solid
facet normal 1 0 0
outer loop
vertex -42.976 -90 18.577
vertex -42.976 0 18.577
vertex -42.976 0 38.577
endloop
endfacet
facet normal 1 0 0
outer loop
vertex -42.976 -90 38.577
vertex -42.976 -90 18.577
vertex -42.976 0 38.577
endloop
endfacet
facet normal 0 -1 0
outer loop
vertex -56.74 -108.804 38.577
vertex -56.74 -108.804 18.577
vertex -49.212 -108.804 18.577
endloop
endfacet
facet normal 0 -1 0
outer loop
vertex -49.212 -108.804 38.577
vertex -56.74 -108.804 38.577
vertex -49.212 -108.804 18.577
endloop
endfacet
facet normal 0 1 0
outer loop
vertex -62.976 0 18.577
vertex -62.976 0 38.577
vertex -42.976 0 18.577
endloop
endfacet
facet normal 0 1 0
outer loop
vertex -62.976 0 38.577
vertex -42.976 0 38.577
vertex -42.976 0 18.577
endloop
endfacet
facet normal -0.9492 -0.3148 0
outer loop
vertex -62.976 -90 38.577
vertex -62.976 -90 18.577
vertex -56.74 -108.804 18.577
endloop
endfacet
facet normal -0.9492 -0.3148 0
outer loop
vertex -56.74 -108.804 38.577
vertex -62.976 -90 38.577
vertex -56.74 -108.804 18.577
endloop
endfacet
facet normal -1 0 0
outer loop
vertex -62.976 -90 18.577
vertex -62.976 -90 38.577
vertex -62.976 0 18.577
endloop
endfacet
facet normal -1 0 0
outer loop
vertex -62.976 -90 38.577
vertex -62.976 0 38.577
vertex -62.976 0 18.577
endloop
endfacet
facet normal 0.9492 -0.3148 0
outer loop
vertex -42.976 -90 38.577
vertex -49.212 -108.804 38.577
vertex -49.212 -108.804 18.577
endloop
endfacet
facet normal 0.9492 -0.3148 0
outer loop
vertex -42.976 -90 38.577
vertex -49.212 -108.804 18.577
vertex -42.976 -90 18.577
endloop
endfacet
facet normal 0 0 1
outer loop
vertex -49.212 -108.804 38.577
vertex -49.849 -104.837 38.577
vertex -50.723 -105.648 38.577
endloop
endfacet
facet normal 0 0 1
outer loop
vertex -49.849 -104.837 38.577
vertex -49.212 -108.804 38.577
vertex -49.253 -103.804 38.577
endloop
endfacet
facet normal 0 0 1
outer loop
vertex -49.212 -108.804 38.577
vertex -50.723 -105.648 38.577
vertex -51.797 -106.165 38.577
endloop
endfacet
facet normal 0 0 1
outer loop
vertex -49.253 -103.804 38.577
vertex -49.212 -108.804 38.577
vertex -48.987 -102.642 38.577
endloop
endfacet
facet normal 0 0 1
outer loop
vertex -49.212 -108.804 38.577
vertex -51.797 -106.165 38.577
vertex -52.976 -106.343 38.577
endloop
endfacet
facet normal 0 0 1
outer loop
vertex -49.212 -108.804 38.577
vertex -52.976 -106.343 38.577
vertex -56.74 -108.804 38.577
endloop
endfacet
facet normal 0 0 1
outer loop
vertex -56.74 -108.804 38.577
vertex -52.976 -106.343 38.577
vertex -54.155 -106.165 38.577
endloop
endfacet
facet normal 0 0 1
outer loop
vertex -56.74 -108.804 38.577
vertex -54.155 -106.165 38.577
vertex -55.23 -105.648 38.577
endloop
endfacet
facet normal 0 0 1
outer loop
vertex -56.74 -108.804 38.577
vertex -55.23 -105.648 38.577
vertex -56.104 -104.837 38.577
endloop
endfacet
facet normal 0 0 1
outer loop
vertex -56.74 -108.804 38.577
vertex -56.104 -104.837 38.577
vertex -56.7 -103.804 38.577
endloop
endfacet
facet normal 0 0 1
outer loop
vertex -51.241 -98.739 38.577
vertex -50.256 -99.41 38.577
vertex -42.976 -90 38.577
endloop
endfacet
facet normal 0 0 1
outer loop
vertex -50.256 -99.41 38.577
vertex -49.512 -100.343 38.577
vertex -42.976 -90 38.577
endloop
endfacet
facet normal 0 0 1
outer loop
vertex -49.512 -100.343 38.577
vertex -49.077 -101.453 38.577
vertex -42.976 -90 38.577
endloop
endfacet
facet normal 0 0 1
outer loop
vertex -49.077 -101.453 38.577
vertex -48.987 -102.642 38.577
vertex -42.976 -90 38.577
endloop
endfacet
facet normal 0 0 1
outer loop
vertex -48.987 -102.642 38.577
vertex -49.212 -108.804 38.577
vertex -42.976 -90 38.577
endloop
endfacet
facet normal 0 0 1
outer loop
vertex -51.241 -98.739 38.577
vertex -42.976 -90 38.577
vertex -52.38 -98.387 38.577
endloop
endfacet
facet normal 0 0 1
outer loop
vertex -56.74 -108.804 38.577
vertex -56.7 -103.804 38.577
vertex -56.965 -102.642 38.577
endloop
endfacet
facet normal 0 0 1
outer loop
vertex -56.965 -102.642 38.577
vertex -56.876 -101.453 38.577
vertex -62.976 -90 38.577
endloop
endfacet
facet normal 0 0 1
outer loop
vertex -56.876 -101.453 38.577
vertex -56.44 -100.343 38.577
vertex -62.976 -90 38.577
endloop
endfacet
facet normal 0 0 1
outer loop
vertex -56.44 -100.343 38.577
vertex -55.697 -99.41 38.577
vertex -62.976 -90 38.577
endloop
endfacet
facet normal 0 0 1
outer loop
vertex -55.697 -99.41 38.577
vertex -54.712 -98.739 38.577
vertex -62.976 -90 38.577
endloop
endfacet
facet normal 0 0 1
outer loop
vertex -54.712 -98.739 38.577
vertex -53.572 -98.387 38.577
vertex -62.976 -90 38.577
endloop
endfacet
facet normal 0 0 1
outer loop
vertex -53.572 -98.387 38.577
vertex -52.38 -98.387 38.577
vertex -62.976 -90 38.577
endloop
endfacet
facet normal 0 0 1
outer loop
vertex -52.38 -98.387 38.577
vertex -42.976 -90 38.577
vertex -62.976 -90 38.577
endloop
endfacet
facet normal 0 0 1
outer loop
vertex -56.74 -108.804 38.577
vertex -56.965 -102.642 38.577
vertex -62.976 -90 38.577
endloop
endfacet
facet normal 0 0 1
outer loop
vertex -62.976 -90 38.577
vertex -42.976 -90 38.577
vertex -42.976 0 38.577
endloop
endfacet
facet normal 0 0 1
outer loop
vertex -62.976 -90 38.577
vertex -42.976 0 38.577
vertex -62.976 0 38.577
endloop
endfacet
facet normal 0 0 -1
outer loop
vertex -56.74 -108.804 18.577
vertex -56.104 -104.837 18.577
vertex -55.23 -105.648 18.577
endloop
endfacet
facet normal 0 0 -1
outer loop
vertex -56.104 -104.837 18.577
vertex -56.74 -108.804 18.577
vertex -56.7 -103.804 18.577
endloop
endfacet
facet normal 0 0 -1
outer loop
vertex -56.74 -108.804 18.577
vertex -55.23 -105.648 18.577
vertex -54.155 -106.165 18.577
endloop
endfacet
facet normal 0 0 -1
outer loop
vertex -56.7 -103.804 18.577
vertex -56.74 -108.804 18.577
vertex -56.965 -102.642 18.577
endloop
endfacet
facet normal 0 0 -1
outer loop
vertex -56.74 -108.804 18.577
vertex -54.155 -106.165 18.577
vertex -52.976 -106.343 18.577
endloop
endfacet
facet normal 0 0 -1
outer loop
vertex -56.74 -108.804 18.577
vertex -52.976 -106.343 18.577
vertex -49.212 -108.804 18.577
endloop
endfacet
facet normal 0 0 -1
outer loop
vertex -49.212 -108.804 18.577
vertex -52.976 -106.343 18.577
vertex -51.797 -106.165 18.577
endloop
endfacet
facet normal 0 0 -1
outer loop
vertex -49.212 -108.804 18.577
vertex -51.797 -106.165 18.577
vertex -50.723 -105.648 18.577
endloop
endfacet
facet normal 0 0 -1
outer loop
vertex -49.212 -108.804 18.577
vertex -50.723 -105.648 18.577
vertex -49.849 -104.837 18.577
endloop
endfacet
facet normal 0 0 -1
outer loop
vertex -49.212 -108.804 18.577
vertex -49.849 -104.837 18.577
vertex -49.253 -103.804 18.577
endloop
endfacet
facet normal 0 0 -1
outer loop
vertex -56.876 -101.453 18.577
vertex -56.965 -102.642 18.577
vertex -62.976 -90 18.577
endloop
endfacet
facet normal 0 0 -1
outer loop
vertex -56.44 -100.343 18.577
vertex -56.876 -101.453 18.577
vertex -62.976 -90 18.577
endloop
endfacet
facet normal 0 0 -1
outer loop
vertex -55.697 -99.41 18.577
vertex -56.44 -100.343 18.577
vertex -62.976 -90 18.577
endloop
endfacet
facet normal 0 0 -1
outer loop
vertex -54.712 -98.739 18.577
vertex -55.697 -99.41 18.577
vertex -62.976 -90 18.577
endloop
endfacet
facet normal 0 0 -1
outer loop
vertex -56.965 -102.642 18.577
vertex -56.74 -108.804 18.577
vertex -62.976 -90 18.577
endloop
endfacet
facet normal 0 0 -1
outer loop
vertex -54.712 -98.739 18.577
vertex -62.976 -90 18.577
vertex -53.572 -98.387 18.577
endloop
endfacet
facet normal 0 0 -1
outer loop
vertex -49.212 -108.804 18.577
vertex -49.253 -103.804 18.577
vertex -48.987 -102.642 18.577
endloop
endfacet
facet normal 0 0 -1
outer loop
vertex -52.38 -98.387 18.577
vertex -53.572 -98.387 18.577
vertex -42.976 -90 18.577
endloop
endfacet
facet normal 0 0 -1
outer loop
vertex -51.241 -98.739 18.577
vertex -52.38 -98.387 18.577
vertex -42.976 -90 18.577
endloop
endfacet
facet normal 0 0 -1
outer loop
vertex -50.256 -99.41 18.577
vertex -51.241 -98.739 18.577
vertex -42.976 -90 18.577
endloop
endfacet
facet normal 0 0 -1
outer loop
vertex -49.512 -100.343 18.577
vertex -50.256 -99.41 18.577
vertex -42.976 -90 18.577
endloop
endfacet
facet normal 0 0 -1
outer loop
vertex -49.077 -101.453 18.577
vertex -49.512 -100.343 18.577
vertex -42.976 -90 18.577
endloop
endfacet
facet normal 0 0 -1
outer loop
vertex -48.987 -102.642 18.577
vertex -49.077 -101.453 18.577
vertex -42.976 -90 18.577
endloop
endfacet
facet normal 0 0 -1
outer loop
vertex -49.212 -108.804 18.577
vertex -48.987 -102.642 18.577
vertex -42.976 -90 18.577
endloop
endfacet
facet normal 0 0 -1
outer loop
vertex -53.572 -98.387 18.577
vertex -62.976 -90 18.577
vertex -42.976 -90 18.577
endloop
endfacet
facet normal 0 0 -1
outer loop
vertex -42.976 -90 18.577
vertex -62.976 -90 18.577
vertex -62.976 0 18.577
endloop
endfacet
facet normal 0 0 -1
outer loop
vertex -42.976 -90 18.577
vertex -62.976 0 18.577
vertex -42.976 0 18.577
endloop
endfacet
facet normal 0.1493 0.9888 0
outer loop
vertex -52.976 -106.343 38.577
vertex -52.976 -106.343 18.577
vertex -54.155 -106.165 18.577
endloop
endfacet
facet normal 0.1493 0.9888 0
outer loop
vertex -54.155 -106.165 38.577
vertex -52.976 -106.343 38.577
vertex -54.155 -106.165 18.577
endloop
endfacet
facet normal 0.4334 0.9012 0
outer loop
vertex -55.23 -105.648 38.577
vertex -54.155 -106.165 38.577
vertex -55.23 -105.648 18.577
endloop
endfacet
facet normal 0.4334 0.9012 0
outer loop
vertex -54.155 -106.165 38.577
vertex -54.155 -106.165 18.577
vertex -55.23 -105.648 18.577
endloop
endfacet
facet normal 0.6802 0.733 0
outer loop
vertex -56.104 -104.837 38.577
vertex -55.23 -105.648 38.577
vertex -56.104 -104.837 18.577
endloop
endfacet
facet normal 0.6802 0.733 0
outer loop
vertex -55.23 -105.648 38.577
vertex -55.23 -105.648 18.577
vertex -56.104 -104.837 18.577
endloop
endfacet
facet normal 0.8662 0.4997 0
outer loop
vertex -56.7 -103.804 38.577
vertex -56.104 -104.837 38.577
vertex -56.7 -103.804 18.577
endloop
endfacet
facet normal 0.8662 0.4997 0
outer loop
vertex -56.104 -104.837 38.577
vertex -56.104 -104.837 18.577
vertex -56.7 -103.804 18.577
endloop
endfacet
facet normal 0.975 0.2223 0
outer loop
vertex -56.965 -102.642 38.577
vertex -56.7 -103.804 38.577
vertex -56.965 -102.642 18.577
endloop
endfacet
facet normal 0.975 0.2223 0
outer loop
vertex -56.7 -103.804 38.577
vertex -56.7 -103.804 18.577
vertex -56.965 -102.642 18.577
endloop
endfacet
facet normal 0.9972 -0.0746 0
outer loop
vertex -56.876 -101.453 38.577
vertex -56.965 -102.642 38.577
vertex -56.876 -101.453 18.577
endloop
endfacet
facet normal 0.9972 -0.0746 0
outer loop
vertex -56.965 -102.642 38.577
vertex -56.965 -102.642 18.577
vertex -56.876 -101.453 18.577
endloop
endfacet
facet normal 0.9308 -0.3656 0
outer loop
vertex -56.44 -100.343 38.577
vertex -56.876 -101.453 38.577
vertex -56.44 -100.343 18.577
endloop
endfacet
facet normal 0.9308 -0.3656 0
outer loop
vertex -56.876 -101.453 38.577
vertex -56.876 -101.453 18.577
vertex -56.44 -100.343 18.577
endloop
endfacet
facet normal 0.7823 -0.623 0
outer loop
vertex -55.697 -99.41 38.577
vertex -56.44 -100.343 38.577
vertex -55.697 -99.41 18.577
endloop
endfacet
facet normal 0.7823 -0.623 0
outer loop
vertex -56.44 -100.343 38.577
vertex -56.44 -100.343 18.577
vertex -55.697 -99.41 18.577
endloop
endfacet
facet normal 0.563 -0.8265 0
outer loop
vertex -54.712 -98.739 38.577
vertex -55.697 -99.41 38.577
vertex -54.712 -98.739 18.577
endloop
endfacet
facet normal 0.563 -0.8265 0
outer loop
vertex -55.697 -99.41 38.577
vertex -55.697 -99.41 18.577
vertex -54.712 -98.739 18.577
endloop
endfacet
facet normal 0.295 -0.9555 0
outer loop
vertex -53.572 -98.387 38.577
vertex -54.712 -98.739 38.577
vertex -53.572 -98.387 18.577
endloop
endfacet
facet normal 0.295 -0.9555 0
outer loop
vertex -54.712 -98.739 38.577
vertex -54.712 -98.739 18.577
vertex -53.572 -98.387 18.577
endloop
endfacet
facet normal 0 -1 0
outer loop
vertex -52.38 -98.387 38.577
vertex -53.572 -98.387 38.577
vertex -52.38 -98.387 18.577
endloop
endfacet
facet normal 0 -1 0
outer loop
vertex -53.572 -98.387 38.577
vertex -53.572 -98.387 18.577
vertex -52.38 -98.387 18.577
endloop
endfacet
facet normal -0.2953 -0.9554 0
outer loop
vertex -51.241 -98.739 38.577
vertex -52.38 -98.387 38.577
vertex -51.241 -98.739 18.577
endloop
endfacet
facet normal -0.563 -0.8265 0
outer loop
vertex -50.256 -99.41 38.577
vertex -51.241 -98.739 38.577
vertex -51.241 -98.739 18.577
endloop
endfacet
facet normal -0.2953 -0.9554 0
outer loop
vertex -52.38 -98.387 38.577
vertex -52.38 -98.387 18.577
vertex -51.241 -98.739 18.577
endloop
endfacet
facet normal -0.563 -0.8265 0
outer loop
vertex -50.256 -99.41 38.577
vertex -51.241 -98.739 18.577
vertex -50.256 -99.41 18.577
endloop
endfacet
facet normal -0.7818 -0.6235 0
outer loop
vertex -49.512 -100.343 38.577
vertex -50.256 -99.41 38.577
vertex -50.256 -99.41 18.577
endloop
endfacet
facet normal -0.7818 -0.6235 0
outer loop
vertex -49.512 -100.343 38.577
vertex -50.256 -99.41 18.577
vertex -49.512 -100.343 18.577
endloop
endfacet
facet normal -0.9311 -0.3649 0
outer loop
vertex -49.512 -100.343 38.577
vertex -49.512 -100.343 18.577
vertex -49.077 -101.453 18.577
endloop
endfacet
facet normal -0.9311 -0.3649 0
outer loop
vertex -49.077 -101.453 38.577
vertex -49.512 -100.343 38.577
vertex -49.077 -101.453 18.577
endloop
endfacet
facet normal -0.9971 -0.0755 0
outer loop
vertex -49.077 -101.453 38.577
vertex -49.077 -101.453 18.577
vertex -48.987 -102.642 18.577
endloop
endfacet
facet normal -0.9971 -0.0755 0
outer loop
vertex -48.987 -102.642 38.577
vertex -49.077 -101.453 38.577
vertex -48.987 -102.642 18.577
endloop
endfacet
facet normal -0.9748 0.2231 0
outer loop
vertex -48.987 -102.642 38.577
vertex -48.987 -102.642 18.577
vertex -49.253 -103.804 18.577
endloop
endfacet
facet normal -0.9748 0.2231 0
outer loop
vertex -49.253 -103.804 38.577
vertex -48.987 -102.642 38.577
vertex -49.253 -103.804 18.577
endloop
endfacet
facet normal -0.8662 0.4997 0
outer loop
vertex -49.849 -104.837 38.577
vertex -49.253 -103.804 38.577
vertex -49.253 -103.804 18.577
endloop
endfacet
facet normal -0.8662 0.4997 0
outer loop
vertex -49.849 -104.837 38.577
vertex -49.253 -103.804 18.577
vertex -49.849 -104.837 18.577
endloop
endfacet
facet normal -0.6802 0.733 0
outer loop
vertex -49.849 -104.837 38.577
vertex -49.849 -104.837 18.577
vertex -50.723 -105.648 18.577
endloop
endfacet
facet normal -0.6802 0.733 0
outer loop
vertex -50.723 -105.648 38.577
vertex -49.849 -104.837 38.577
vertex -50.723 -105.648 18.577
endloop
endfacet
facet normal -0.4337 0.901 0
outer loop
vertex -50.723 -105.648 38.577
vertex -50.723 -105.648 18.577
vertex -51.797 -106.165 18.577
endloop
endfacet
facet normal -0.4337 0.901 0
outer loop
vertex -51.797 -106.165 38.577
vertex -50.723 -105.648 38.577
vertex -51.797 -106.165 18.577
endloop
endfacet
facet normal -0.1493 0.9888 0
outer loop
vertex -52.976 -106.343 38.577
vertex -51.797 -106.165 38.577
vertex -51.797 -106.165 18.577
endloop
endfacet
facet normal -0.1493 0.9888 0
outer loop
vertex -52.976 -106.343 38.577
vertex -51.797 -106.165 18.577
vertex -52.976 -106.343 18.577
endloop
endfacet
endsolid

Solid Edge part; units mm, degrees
sketch "Sketch1" plane through (0, 0, 0) normal (0, -1, 0) x (1, 0, 0)
  line L0 (-62.9763, 18.5767) -> (-42.9763, 18.5767)
  line L1 (-42.9763, 18.5767) -> (-42.9763, 38.5767)
  line L2 (-42.9763, 38.5767) -> (-62.9763, 38.5767)
  line L3 (-62.9763, 38.5767) -> (-62.9763, 18.5767)
extrude "Protrusion1" add sketch "Sketch1" along normal blind 90
sketch "Sketch2" plane through (-52.9763, -30, 18.5767) normal (0, 0, -1) x (0, -1, 0)
  circle A0 centre (72.3427, 0) radius 4
  line L0 (60, 10) -> (78.8043, 3.7638)
  line L1 (78.8043, 3.7638) -> (78.8043, -3.7638)
  line L2 (78.8043, -3.7638) -> (60, -10)
  line L3 (60, -10) -> (60, 10)
extrude "Protrusion2" add sketch "Sketch2" against normal up to vertex (20 mm away)
